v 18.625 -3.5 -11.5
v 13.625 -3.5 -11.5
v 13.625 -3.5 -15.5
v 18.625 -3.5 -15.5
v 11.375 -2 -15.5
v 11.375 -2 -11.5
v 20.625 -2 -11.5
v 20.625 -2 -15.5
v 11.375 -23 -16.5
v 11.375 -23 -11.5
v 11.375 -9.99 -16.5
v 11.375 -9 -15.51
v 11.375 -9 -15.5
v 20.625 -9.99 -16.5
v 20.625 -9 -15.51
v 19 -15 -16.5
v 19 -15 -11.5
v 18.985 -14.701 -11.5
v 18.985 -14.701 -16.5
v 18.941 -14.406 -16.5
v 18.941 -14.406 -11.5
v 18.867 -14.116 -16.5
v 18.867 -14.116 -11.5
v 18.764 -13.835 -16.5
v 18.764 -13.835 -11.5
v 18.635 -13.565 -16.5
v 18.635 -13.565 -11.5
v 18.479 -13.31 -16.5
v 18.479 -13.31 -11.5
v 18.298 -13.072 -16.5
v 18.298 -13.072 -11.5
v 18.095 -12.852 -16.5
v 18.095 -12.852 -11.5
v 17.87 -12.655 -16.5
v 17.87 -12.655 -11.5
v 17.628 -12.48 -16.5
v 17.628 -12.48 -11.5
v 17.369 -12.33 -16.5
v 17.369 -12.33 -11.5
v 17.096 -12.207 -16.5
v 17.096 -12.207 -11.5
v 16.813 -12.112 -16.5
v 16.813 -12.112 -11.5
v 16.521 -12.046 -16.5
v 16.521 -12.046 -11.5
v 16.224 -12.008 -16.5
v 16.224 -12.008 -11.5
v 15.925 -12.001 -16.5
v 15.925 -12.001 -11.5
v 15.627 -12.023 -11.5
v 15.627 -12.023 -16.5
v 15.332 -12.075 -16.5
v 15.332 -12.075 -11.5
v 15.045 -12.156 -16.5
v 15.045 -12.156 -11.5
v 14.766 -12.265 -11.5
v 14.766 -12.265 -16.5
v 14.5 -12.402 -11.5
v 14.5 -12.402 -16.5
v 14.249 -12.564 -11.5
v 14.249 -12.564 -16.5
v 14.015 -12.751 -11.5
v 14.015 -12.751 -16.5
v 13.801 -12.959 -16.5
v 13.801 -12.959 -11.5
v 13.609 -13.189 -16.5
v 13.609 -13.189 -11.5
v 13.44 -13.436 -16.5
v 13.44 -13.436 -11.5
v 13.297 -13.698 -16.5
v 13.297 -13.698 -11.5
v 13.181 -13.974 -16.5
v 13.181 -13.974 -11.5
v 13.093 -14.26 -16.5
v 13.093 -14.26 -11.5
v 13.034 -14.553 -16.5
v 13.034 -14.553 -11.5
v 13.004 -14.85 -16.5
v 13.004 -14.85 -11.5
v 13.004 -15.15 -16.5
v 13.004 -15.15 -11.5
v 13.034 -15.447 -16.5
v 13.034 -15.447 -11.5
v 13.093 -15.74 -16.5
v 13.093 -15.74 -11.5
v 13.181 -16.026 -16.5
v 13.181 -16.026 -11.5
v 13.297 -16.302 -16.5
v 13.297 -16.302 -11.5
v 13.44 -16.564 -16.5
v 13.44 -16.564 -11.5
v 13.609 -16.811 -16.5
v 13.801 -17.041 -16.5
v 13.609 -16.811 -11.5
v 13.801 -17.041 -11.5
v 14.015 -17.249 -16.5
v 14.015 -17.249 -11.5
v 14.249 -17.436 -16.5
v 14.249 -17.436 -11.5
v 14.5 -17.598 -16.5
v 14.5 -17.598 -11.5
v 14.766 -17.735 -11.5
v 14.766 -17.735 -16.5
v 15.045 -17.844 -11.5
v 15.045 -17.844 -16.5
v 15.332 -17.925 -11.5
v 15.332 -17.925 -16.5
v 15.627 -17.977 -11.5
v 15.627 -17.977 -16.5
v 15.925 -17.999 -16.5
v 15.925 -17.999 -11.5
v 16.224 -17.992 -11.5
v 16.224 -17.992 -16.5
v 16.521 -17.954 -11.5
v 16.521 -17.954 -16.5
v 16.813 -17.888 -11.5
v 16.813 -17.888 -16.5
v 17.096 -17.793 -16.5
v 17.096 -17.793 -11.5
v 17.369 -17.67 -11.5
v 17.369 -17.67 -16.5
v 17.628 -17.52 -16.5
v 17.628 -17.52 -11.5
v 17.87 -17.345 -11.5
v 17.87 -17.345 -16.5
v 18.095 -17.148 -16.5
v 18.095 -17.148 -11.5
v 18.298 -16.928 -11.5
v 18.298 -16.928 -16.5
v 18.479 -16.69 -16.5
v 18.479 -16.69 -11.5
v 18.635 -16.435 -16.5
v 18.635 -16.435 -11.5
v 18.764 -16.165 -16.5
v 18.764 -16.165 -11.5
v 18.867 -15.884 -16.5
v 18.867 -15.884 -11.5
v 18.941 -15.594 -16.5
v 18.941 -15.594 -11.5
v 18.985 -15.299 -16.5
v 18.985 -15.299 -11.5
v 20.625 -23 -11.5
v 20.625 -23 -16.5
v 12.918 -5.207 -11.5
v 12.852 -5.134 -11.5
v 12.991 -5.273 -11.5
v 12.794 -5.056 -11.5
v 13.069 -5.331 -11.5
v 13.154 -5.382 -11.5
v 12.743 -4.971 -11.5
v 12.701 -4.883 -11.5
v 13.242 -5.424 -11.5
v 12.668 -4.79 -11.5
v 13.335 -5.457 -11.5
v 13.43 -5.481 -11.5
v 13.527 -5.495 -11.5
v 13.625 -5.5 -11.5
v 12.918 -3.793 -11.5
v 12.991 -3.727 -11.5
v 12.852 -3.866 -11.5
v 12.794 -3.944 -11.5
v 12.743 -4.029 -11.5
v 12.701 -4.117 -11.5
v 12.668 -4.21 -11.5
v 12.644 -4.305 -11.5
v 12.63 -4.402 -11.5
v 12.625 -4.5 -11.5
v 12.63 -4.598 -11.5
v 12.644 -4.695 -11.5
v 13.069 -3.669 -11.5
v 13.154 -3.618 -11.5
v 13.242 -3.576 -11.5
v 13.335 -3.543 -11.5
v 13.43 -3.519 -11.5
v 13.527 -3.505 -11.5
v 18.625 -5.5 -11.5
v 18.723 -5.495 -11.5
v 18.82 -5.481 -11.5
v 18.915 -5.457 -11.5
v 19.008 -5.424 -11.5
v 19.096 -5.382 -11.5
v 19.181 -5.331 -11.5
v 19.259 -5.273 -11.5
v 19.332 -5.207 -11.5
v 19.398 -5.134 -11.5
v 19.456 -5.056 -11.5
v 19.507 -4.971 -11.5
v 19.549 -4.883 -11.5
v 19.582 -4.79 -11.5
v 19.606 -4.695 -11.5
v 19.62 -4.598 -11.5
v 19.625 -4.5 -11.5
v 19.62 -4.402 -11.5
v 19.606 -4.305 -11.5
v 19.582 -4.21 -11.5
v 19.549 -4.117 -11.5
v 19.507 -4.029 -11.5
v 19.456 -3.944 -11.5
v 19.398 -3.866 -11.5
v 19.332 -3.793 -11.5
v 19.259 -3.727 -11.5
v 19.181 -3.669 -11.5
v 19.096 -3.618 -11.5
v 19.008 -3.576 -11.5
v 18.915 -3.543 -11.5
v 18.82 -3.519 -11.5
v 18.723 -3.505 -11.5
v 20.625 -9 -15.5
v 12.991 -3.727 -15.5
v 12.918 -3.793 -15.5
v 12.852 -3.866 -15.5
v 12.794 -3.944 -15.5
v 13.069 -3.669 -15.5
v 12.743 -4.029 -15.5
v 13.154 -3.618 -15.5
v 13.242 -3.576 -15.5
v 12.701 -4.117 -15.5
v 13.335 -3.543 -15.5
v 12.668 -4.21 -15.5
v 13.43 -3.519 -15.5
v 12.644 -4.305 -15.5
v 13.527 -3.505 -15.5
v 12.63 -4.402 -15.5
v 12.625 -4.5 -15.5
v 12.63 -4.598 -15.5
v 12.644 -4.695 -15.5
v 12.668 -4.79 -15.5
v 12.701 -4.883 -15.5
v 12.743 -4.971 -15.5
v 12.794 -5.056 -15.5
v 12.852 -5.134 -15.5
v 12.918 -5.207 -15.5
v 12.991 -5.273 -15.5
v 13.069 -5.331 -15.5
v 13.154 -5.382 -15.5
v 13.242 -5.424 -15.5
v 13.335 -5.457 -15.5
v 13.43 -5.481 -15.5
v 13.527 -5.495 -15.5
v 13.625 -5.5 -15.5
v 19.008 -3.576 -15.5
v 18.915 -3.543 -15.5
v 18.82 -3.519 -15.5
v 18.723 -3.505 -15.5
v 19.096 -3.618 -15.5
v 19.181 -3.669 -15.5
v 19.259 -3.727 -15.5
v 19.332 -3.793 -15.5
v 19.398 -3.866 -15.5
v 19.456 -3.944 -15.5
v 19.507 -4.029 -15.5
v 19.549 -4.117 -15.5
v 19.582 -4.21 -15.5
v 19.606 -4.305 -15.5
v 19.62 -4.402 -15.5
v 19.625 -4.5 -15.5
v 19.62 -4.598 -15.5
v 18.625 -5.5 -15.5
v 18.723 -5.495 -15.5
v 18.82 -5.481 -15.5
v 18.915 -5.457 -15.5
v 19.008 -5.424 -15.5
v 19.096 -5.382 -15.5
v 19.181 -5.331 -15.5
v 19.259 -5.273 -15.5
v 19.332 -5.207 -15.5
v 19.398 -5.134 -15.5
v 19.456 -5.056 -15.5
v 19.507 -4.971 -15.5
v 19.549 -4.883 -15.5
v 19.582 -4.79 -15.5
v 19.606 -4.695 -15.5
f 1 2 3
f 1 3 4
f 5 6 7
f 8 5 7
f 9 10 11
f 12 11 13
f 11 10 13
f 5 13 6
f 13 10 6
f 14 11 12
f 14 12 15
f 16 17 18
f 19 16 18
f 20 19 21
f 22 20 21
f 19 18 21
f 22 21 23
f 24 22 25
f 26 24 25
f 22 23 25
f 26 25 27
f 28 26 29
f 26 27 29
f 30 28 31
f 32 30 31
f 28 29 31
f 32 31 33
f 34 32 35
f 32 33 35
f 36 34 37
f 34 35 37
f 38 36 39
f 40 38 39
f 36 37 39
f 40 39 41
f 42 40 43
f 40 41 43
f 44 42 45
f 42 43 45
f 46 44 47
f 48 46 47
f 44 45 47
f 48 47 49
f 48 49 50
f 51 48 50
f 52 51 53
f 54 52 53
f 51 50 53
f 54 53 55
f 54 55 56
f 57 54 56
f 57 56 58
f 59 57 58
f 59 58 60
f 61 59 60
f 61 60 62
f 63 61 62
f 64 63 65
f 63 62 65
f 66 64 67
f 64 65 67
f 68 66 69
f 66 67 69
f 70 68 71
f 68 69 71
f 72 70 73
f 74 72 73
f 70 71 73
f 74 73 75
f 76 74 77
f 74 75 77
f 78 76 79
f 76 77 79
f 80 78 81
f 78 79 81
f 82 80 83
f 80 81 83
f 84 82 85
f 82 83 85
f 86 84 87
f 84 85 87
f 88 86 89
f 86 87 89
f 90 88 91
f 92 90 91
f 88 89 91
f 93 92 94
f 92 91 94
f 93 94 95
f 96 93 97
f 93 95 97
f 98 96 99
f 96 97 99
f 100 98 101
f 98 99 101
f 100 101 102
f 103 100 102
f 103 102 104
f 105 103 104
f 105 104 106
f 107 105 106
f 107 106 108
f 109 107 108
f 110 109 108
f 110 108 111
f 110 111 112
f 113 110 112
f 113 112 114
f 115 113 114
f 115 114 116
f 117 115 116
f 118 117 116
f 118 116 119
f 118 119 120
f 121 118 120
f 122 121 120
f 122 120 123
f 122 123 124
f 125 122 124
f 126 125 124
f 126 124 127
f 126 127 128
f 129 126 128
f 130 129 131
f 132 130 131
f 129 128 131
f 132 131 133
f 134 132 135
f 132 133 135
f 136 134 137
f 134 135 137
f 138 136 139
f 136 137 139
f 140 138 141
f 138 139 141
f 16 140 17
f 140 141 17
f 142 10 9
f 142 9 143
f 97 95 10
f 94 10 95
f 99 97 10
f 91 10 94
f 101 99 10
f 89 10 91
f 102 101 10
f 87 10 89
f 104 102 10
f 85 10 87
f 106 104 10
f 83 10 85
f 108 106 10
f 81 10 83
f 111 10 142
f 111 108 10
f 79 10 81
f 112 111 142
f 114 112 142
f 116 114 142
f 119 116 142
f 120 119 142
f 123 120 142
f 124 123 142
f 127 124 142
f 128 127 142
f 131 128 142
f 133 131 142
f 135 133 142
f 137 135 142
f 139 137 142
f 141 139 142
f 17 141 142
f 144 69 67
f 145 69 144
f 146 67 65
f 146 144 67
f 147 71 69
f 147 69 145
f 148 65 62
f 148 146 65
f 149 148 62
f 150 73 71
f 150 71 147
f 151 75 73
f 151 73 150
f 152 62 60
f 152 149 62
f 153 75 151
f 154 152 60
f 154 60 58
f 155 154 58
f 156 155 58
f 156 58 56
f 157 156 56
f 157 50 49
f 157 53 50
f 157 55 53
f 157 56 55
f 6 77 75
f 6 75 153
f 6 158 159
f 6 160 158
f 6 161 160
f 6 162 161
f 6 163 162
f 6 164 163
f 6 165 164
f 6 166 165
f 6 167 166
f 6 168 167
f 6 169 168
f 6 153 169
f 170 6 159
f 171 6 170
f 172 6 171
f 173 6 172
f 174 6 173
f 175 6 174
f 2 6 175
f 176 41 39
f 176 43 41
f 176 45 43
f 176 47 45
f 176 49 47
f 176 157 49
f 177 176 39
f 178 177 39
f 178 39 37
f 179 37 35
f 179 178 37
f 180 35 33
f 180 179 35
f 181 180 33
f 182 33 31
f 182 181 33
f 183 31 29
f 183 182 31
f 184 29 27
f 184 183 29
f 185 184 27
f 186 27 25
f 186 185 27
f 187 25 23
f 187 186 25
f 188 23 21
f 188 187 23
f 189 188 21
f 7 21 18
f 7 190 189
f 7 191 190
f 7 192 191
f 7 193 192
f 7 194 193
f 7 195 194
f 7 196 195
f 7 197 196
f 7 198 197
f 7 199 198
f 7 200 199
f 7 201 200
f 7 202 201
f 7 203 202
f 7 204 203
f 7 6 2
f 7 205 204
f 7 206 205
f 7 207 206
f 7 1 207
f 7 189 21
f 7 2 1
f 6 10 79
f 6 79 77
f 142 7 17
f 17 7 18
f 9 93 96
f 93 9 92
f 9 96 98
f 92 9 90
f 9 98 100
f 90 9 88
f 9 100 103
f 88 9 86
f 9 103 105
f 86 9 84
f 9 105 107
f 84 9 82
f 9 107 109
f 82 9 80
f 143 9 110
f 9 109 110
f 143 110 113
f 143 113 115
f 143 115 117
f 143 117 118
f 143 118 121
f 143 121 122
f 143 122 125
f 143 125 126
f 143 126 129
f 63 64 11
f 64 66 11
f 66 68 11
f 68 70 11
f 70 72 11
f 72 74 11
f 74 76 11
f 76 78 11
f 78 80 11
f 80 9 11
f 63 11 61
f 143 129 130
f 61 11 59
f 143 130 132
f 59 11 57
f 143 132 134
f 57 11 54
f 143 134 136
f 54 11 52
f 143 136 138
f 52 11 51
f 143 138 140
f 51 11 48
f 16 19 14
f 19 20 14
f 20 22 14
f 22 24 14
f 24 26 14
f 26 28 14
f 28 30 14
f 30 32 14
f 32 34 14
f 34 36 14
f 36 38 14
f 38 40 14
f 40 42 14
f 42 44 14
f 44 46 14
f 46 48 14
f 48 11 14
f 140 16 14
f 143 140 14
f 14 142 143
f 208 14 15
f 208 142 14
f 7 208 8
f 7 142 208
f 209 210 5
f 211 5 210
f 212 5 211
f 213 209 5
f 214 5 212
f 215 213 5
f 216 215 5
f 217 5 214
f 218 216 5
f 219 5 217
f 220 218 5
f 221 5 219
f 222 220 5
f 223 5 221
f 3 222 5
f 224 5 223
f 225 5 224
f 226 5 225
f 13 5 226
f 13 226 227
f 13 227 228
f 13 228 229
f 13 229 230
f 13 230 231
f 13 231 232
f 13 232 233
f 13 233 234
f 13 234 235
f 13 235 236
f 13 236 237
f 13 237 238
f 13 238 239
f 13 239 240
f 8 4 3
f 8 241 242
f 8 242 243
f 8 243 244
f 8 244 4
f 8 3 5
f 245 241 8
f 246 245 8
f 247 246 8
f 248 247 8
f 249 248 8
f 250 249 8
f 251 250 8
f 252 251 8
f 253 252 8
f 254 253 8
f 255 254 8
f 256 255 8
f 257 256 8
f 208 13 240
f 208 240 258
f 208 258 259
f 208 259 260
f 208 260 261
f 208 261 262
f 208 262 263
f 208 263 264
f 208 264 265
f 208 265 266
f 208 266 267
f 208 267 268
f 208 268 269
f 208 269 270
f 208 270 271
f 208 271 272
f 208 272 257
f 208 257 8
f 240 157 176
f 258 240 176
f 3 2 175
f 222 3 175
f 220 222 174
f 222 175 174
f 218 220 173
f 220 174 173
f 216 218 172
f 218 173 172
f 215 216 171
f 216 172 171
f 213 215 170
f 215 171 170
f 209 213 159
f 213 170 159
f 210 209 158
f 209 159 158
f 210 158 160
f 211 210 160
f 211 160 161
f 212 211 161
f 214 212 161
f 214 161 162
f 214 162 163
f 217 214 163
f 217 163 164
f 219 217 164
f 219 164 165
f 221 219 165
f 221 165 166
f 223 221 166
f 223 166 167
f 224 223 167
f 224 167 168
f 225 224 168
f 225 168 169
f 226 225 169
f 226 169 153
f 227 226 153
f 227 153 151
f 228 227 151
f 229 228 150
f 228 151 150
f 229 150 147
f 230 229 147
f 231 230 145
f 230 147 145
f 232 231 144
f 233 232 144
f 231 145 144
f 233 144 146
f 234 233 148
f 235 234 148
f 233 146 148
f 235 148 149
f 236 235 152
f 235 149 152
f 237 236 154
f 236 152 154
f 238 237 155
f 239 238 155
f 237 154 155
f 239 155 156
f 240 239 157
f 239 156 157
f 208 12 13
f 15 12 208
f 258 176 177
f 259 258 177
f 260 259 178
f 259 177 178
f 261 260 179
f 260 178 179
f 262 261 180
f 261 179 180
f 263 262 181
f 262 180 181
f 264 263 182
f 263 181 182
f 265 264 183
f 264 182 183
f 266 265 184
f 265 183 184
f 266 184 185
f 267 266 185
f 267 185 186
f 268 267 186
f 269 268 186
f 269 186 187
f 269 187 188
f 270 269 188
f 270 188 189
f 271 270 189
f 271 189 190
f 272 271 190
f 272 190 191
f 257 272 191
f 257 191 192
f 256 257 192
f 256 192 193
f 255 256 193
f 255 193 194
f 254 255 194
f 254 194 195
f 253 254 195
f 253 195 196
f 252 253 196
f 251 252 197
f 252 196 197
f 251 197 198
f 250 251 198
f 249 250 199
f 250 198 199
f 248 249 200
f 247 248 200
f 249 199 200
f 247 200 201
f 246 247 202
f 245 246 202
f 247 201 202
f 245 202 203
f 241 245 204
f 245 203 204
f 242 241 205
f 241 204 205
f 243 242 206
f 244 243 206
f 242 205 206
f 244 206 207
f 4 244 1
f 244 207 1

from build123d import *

# Parameters (mm, degrees)
SKETCH011_W     = 9.25
SKETCH011_H     = 21
SKETCH011_R     = 3
PAD006_DEPTH    = 5
SKETCH021_W     = 9.25
SKETCH021_H     = 7
POCKET006_DEPTH = 1
CHAMFER_SIZE    = 0.99


with BuildPart() as part:
    # Sketch011 → Pad006 (new body)
    with BuildSketch(Plane(origin=(16, -15, -11.5), x_dir=(1, 0, 0), z_dir=(0, 0, 1))):
        with Locations((0, 2.5)):
            Rectangle(SKETCH011_W, SKETCH011_H)
        Circle(SKETCH011_R, mode=Mode.SUBTRACT)
        with BuildLine():
            ThreePointArc((-2.375, 11.5), (-3.375, 10.5), (-2.375, 9.5))
            Line((-2.375, 9.5), (2.625, 9.5))
            ThreePointArc((2.625, 9.5), (3.625, 10.5), (2.625, 11.5))
            Line((-2.375, 11.5), (2.625, 11.5))
        make_face(mode=Mode.SUBTRACT)
    extrude(amount=-PAD006_DEPTH)

    # Sketch021 → Pocket006 (cut)
    with BuildSketch(Plane(origin=(16, -15, -16.5), x_dir=(1, 0, 0), z_dir=(0, 0, -1))):
        with Locations((0, -9.5)):
            Rectangle(SKETCH021_W, SKETCH021_H)
    extrude(amount=-POCKET006_DEPTH, mode=Mode.SUBTRACT)

    # Chamfer
    chamfer_edges = [part.edges().sort_by_distance(p)[0] for p in [
        (16, -9, -16.5),
    ]]
    chamfer(chamfer_edges, length=CHAMFER_SIZE)


solid = part.part
